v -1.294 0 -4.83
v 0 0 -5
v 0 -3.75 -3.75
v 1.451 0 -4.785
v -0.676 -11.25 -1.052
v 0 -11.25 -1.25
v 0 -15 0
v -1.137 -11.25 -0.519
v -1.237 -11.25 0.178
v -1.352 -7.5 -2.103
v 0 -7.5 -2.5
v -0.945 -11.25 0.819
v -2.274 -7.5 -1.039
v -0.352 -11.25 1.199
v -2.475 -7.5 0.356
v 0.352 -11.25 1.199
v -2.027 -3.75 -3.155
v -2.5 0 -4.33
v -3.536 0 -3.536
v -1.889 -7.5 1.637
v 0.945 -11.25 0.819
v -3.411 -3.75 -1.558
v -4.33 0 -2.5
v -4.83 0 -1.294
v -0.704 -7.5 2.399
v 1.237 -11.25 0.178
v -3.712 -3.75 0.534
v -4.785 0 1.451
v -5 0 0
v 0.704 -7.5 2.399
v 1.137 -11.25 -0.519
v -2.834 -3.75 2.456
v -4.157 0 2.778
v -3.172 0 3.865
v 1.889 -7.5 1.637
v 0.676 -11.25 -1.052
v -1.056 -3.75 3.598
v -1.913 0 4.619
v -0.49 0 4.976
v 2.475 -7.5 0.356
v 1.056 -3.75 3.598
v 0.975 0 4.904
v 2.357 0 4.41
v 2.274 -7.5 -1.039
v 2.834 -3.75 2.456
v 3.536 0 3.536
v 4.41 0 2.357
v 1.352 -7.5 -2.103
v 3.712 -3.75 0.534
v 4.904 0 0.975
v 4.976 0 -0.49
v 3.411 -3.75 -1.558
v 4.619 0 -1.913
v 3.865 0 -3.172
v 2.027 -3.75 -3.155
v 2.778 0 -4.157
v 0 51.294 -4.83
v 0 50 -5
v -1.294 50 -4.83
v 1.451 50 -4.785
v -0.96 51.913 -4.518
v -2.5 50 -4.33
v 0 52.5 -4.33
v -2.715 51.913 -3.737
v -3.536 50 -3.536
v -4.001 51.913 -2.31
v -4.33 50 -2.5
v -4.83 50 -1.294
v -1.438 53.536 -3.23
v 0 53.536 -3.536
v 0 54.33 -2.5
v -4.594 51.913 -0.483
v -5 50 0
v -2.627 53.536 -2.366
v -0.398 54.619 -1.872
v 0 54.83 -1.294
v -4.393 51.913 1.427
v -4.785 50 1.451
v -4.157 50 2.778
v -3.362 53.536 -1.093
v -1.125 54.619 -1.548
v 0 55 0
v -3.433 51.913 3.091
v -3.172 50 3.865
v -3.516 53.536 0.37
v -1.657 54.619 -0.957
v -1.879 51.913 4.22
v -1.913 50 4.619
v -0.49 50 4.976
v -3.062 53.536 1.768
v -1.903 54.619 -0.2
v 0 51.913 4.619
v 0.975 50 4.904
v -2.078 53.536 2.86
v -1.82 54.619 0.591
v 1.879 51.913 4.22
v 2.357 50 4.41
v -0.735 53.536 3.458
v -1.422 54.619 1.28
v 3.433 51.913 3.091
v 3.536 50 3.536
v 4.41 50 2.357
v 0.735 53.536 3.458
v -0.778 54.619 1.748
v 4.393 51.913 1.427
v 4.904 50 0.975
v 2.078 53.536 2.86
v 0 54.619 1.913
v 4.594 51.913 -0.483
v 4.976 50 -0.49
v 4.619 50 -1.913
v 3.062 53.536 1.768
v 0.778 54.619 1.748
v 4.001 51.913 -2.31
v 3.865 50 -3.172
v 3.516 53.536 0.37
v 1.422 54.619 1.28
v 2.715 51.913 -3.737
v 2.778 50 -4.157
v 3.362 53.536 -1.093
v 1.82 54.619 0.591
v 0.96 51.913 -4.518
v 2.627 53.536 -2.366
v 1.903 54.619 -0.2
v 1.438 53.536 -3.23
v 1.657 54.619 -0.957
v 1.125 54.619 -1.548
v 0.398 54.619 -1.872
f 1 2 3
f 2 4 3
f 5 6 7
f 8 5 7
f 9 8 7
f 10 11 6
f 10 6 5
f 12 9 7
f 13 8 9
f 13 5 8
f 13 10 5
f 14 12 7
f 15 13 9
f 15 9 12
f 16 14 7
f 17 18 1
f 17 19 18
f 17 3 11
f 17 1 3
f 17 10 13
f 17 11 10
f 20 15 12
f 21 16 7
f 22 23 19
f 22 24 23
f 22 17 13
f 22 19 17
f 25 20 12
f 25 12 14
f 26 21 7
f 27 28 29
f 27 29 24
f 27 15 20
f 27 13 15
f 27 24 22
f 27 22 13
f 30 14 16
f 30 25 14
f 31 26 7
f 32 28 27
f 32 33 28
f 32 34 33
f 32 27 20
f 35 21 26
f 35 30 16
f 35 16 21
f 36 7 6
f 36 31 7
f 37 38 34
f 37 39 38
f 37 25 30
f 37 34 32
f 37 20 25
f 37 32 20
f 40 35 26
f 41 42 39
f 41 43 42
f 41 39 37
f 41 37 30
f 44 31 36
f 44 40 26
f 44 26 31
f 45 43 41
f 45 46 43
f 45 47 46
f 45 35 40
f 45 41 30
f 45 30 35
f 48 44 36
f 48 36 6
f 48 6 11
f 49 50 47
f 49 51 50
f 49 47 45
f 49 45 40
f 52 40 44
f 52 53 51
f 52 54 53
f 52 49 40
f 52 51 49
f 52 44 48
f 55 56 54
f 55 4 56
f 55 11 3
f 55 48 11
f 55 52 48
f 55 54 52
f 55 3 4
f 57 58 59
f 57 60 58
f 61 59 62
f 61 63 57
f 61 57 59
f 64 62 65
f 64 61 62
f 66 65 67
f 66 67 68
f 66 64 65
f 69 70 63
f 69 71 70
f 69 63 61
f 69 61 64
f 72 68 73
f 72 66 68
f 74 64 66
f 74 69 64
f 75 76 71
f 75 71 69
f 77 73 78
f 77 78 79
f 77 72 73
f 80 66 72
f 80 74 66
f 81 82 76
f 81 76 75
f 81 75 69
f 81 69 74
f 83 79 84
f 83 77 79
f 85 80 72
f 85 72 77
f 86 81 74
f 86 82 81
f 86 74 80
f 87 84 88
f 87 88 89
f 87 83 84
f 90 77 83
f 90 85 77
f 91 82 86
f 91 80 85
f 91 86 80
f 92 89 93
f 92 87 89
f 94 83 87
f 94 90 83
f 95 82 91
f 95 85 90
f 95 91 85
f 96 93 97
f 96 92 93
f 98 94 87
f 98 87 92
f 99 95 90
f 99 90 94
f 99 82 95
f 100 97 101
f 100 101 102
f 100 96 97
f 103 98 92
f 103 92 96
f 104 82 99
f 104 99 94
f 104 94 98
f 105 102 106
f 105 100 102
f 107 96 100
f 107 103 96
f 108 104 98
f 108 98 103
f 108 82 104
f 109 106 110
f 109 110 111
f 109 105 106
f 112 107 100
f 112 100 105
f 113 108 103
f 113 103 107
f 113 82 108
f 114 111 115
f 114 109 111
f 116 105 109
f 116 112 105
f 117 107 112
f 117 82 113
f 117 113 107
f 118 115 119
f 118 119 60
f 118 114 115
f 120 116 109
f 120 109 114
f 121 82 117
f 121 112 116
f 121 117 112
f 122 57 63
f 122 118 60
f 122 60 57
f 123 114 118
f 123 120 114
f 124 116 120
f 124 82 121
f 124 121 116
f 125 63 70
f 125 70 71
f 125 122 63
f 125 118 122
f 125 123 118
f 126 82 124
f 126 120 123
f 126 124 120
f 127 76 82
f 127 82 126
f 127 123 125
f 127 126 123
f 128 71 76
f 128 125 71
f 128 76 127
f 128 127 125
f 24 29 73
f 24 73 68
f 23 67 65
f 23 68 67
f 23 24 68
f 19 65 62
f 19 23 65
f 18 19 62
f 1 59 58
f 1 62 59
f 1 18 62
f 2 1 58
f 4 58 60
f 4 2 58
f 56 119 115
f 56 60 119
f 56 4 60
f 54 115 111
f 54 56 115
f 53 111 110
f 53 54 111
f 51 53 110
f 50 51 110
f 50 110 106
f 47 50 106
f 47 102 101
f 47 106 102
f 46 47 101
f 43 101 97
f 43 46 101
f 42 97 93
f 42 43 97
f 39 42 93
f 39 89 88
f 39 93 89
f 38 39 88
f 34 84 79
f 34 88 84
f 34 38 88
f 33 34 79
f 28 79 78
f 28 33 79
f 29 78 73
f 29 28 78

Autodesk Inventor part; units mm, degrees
ref_plane "YZ Plane" through (0, 0, 0) normal (1, 0, 0) x (0, 1, 0)
ref_plane "XZ Plane" through (0, 0, 0) normal (0, 1, 0) x (-1, 0, 0)
ref_plane "XY Plane" through (0, 0, 0) normal (0, 0, 1) x (1, 0, 0)
sketch "Sketch1" plane through (0, 0, 0) normal (0, 1, 0) x (-1, 0, 0)
  circle A0 centre (0, 0) radius 5
  dimension "d0" = 10
extrude "Extrusion1" add sketch "Sketch1" along normal blind 50
sketch "Sketch2" plane through (0, 0, 0) normal (1, 0, 0) x (0, 1, 0)
  line L0 (0, 5) -> (0, -5) projected
  line L1 (0, -5) -> (0, 0)
  line L2 (-15, 0) -> (0, 0)
  line L3 (0, -5) -> (-15, 0)
  dimension "d3" = 15
revolve "Revolution1" add sketch "Sketch2" angle 360 about axis through (0, -15, 0) along (0, 1, 0)
sketch "Sketch4" plane through (0, 0, 0) normal (1, 0, 0) x (0, 1, 0)
  line L0 (50, -5) -> (50, 5) projected
  arc A0 (50, -5) -> (55, 0) centre (50, 0) ccw
  line L1 (55, 0) -> (50, 0)
  line L2 (50, -5) -> (50, 0)
  point P0 (0, 0)
revolve "Revolution2" add sketch "Sketch4" angle 360 about axis through (0, 55, 0) along (0, -1, 0)
equation "\"d0\" = cylinder_r"
equation "\"d1\" = cylinder_h"
equation "\"d3\" = cone_h"
equation "\"cylinder_h\" = 50"
equation "\"cone_h\" = 15"
equation "\"cylinder_r\" = 10"
properties part number "parametrized pencile"
